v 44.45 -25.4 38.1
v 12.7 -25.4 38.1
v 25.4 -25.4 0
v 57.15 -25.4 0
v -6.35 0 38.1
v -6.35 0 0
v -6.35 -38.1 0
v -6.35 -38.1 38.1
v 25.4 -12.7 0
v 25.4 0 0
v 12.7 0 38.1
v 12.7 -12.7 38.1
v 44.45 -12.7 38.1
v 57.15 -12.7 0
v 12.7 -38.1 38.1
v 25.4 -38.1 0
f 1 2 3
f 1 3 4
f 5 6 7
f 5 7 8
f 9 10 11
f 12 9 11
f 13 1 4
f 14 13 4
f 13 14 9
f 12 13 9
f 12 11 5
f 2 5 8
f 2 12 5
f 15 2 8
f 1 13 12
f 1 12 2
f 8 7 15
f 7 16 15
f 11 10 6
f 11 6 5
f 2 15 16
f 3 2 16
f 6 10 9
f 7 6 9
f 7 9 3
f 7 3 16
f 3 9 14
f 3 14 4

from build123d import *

# Parameters (mm, degrees)
F0_W     = 57.15
F0_H     = 38.1
F1_DEPTH = 38.1
F2_W     = 31.75
F2_H     = 38.1
F3_DEPTH = 12.7
F5_DEPTH = 12.7
F6_W     = 31.75
F6_H     = 38.1
F7_DEPTH = 12.7
F8_DEPTH = 6.35


with BuildPart() as f1:
    # F0 (on Front) → F1 (new body)
    with BuildSketch(Plane.XZ):
        with Locations((28.575, 19.05)):
            Rectangle(F0_W, F0_H)
    extrude(amount=F1_DEPTH)

    # F2 (on face) → F3 (cut)
    with BuildSketch(Plane.XZ.offset(38.1)):
        with Locations((41.275, 19.05)):
            Rectangle(F2_W, F2_H)
        Polygon((12.7, 38.1), (25.4, 0), (25.4, 38.1), align=None)
    extrude(amount=-F3_DEPTH, mode=Mode.SUBTRACT)

    # F4 (on face) → F5 (cut)
    with BuildSketch(Plane.XZ.offset(25.4)):
        Polygon((44.45, 38.1), (57.15, 0), (57.15, 38.1), align=None)
    extrude(amount=-F5_DEPTH, mode=Mode.SUBTRACT)

    # F6 (on face) → F7 (cut)
    with BuildSketch(Plane(origin=(0, 0, 0), x_dir=(-1, 0, 0), z_dir=(0, 1, 0))):
        with Locations((-41.275, 19.05)):
            Rectangle(F6_W, F6_H)
        Polygon((-12.7, 38.1), (-25.4, 38.1), (-25.4, 0), align=None)
    extrude(amount=-F7_DEPTH, mode=Mode.SUBTRACT)

    # F8 (add): a face of the model
    f8_faces = [f1.faces().sort_by_distance(p)[0] for p in [
        (0, -19.05, 19.05),
    ]]
    extrude(f8_faces, amount=F8_DEPTH)


solid = f1.part
